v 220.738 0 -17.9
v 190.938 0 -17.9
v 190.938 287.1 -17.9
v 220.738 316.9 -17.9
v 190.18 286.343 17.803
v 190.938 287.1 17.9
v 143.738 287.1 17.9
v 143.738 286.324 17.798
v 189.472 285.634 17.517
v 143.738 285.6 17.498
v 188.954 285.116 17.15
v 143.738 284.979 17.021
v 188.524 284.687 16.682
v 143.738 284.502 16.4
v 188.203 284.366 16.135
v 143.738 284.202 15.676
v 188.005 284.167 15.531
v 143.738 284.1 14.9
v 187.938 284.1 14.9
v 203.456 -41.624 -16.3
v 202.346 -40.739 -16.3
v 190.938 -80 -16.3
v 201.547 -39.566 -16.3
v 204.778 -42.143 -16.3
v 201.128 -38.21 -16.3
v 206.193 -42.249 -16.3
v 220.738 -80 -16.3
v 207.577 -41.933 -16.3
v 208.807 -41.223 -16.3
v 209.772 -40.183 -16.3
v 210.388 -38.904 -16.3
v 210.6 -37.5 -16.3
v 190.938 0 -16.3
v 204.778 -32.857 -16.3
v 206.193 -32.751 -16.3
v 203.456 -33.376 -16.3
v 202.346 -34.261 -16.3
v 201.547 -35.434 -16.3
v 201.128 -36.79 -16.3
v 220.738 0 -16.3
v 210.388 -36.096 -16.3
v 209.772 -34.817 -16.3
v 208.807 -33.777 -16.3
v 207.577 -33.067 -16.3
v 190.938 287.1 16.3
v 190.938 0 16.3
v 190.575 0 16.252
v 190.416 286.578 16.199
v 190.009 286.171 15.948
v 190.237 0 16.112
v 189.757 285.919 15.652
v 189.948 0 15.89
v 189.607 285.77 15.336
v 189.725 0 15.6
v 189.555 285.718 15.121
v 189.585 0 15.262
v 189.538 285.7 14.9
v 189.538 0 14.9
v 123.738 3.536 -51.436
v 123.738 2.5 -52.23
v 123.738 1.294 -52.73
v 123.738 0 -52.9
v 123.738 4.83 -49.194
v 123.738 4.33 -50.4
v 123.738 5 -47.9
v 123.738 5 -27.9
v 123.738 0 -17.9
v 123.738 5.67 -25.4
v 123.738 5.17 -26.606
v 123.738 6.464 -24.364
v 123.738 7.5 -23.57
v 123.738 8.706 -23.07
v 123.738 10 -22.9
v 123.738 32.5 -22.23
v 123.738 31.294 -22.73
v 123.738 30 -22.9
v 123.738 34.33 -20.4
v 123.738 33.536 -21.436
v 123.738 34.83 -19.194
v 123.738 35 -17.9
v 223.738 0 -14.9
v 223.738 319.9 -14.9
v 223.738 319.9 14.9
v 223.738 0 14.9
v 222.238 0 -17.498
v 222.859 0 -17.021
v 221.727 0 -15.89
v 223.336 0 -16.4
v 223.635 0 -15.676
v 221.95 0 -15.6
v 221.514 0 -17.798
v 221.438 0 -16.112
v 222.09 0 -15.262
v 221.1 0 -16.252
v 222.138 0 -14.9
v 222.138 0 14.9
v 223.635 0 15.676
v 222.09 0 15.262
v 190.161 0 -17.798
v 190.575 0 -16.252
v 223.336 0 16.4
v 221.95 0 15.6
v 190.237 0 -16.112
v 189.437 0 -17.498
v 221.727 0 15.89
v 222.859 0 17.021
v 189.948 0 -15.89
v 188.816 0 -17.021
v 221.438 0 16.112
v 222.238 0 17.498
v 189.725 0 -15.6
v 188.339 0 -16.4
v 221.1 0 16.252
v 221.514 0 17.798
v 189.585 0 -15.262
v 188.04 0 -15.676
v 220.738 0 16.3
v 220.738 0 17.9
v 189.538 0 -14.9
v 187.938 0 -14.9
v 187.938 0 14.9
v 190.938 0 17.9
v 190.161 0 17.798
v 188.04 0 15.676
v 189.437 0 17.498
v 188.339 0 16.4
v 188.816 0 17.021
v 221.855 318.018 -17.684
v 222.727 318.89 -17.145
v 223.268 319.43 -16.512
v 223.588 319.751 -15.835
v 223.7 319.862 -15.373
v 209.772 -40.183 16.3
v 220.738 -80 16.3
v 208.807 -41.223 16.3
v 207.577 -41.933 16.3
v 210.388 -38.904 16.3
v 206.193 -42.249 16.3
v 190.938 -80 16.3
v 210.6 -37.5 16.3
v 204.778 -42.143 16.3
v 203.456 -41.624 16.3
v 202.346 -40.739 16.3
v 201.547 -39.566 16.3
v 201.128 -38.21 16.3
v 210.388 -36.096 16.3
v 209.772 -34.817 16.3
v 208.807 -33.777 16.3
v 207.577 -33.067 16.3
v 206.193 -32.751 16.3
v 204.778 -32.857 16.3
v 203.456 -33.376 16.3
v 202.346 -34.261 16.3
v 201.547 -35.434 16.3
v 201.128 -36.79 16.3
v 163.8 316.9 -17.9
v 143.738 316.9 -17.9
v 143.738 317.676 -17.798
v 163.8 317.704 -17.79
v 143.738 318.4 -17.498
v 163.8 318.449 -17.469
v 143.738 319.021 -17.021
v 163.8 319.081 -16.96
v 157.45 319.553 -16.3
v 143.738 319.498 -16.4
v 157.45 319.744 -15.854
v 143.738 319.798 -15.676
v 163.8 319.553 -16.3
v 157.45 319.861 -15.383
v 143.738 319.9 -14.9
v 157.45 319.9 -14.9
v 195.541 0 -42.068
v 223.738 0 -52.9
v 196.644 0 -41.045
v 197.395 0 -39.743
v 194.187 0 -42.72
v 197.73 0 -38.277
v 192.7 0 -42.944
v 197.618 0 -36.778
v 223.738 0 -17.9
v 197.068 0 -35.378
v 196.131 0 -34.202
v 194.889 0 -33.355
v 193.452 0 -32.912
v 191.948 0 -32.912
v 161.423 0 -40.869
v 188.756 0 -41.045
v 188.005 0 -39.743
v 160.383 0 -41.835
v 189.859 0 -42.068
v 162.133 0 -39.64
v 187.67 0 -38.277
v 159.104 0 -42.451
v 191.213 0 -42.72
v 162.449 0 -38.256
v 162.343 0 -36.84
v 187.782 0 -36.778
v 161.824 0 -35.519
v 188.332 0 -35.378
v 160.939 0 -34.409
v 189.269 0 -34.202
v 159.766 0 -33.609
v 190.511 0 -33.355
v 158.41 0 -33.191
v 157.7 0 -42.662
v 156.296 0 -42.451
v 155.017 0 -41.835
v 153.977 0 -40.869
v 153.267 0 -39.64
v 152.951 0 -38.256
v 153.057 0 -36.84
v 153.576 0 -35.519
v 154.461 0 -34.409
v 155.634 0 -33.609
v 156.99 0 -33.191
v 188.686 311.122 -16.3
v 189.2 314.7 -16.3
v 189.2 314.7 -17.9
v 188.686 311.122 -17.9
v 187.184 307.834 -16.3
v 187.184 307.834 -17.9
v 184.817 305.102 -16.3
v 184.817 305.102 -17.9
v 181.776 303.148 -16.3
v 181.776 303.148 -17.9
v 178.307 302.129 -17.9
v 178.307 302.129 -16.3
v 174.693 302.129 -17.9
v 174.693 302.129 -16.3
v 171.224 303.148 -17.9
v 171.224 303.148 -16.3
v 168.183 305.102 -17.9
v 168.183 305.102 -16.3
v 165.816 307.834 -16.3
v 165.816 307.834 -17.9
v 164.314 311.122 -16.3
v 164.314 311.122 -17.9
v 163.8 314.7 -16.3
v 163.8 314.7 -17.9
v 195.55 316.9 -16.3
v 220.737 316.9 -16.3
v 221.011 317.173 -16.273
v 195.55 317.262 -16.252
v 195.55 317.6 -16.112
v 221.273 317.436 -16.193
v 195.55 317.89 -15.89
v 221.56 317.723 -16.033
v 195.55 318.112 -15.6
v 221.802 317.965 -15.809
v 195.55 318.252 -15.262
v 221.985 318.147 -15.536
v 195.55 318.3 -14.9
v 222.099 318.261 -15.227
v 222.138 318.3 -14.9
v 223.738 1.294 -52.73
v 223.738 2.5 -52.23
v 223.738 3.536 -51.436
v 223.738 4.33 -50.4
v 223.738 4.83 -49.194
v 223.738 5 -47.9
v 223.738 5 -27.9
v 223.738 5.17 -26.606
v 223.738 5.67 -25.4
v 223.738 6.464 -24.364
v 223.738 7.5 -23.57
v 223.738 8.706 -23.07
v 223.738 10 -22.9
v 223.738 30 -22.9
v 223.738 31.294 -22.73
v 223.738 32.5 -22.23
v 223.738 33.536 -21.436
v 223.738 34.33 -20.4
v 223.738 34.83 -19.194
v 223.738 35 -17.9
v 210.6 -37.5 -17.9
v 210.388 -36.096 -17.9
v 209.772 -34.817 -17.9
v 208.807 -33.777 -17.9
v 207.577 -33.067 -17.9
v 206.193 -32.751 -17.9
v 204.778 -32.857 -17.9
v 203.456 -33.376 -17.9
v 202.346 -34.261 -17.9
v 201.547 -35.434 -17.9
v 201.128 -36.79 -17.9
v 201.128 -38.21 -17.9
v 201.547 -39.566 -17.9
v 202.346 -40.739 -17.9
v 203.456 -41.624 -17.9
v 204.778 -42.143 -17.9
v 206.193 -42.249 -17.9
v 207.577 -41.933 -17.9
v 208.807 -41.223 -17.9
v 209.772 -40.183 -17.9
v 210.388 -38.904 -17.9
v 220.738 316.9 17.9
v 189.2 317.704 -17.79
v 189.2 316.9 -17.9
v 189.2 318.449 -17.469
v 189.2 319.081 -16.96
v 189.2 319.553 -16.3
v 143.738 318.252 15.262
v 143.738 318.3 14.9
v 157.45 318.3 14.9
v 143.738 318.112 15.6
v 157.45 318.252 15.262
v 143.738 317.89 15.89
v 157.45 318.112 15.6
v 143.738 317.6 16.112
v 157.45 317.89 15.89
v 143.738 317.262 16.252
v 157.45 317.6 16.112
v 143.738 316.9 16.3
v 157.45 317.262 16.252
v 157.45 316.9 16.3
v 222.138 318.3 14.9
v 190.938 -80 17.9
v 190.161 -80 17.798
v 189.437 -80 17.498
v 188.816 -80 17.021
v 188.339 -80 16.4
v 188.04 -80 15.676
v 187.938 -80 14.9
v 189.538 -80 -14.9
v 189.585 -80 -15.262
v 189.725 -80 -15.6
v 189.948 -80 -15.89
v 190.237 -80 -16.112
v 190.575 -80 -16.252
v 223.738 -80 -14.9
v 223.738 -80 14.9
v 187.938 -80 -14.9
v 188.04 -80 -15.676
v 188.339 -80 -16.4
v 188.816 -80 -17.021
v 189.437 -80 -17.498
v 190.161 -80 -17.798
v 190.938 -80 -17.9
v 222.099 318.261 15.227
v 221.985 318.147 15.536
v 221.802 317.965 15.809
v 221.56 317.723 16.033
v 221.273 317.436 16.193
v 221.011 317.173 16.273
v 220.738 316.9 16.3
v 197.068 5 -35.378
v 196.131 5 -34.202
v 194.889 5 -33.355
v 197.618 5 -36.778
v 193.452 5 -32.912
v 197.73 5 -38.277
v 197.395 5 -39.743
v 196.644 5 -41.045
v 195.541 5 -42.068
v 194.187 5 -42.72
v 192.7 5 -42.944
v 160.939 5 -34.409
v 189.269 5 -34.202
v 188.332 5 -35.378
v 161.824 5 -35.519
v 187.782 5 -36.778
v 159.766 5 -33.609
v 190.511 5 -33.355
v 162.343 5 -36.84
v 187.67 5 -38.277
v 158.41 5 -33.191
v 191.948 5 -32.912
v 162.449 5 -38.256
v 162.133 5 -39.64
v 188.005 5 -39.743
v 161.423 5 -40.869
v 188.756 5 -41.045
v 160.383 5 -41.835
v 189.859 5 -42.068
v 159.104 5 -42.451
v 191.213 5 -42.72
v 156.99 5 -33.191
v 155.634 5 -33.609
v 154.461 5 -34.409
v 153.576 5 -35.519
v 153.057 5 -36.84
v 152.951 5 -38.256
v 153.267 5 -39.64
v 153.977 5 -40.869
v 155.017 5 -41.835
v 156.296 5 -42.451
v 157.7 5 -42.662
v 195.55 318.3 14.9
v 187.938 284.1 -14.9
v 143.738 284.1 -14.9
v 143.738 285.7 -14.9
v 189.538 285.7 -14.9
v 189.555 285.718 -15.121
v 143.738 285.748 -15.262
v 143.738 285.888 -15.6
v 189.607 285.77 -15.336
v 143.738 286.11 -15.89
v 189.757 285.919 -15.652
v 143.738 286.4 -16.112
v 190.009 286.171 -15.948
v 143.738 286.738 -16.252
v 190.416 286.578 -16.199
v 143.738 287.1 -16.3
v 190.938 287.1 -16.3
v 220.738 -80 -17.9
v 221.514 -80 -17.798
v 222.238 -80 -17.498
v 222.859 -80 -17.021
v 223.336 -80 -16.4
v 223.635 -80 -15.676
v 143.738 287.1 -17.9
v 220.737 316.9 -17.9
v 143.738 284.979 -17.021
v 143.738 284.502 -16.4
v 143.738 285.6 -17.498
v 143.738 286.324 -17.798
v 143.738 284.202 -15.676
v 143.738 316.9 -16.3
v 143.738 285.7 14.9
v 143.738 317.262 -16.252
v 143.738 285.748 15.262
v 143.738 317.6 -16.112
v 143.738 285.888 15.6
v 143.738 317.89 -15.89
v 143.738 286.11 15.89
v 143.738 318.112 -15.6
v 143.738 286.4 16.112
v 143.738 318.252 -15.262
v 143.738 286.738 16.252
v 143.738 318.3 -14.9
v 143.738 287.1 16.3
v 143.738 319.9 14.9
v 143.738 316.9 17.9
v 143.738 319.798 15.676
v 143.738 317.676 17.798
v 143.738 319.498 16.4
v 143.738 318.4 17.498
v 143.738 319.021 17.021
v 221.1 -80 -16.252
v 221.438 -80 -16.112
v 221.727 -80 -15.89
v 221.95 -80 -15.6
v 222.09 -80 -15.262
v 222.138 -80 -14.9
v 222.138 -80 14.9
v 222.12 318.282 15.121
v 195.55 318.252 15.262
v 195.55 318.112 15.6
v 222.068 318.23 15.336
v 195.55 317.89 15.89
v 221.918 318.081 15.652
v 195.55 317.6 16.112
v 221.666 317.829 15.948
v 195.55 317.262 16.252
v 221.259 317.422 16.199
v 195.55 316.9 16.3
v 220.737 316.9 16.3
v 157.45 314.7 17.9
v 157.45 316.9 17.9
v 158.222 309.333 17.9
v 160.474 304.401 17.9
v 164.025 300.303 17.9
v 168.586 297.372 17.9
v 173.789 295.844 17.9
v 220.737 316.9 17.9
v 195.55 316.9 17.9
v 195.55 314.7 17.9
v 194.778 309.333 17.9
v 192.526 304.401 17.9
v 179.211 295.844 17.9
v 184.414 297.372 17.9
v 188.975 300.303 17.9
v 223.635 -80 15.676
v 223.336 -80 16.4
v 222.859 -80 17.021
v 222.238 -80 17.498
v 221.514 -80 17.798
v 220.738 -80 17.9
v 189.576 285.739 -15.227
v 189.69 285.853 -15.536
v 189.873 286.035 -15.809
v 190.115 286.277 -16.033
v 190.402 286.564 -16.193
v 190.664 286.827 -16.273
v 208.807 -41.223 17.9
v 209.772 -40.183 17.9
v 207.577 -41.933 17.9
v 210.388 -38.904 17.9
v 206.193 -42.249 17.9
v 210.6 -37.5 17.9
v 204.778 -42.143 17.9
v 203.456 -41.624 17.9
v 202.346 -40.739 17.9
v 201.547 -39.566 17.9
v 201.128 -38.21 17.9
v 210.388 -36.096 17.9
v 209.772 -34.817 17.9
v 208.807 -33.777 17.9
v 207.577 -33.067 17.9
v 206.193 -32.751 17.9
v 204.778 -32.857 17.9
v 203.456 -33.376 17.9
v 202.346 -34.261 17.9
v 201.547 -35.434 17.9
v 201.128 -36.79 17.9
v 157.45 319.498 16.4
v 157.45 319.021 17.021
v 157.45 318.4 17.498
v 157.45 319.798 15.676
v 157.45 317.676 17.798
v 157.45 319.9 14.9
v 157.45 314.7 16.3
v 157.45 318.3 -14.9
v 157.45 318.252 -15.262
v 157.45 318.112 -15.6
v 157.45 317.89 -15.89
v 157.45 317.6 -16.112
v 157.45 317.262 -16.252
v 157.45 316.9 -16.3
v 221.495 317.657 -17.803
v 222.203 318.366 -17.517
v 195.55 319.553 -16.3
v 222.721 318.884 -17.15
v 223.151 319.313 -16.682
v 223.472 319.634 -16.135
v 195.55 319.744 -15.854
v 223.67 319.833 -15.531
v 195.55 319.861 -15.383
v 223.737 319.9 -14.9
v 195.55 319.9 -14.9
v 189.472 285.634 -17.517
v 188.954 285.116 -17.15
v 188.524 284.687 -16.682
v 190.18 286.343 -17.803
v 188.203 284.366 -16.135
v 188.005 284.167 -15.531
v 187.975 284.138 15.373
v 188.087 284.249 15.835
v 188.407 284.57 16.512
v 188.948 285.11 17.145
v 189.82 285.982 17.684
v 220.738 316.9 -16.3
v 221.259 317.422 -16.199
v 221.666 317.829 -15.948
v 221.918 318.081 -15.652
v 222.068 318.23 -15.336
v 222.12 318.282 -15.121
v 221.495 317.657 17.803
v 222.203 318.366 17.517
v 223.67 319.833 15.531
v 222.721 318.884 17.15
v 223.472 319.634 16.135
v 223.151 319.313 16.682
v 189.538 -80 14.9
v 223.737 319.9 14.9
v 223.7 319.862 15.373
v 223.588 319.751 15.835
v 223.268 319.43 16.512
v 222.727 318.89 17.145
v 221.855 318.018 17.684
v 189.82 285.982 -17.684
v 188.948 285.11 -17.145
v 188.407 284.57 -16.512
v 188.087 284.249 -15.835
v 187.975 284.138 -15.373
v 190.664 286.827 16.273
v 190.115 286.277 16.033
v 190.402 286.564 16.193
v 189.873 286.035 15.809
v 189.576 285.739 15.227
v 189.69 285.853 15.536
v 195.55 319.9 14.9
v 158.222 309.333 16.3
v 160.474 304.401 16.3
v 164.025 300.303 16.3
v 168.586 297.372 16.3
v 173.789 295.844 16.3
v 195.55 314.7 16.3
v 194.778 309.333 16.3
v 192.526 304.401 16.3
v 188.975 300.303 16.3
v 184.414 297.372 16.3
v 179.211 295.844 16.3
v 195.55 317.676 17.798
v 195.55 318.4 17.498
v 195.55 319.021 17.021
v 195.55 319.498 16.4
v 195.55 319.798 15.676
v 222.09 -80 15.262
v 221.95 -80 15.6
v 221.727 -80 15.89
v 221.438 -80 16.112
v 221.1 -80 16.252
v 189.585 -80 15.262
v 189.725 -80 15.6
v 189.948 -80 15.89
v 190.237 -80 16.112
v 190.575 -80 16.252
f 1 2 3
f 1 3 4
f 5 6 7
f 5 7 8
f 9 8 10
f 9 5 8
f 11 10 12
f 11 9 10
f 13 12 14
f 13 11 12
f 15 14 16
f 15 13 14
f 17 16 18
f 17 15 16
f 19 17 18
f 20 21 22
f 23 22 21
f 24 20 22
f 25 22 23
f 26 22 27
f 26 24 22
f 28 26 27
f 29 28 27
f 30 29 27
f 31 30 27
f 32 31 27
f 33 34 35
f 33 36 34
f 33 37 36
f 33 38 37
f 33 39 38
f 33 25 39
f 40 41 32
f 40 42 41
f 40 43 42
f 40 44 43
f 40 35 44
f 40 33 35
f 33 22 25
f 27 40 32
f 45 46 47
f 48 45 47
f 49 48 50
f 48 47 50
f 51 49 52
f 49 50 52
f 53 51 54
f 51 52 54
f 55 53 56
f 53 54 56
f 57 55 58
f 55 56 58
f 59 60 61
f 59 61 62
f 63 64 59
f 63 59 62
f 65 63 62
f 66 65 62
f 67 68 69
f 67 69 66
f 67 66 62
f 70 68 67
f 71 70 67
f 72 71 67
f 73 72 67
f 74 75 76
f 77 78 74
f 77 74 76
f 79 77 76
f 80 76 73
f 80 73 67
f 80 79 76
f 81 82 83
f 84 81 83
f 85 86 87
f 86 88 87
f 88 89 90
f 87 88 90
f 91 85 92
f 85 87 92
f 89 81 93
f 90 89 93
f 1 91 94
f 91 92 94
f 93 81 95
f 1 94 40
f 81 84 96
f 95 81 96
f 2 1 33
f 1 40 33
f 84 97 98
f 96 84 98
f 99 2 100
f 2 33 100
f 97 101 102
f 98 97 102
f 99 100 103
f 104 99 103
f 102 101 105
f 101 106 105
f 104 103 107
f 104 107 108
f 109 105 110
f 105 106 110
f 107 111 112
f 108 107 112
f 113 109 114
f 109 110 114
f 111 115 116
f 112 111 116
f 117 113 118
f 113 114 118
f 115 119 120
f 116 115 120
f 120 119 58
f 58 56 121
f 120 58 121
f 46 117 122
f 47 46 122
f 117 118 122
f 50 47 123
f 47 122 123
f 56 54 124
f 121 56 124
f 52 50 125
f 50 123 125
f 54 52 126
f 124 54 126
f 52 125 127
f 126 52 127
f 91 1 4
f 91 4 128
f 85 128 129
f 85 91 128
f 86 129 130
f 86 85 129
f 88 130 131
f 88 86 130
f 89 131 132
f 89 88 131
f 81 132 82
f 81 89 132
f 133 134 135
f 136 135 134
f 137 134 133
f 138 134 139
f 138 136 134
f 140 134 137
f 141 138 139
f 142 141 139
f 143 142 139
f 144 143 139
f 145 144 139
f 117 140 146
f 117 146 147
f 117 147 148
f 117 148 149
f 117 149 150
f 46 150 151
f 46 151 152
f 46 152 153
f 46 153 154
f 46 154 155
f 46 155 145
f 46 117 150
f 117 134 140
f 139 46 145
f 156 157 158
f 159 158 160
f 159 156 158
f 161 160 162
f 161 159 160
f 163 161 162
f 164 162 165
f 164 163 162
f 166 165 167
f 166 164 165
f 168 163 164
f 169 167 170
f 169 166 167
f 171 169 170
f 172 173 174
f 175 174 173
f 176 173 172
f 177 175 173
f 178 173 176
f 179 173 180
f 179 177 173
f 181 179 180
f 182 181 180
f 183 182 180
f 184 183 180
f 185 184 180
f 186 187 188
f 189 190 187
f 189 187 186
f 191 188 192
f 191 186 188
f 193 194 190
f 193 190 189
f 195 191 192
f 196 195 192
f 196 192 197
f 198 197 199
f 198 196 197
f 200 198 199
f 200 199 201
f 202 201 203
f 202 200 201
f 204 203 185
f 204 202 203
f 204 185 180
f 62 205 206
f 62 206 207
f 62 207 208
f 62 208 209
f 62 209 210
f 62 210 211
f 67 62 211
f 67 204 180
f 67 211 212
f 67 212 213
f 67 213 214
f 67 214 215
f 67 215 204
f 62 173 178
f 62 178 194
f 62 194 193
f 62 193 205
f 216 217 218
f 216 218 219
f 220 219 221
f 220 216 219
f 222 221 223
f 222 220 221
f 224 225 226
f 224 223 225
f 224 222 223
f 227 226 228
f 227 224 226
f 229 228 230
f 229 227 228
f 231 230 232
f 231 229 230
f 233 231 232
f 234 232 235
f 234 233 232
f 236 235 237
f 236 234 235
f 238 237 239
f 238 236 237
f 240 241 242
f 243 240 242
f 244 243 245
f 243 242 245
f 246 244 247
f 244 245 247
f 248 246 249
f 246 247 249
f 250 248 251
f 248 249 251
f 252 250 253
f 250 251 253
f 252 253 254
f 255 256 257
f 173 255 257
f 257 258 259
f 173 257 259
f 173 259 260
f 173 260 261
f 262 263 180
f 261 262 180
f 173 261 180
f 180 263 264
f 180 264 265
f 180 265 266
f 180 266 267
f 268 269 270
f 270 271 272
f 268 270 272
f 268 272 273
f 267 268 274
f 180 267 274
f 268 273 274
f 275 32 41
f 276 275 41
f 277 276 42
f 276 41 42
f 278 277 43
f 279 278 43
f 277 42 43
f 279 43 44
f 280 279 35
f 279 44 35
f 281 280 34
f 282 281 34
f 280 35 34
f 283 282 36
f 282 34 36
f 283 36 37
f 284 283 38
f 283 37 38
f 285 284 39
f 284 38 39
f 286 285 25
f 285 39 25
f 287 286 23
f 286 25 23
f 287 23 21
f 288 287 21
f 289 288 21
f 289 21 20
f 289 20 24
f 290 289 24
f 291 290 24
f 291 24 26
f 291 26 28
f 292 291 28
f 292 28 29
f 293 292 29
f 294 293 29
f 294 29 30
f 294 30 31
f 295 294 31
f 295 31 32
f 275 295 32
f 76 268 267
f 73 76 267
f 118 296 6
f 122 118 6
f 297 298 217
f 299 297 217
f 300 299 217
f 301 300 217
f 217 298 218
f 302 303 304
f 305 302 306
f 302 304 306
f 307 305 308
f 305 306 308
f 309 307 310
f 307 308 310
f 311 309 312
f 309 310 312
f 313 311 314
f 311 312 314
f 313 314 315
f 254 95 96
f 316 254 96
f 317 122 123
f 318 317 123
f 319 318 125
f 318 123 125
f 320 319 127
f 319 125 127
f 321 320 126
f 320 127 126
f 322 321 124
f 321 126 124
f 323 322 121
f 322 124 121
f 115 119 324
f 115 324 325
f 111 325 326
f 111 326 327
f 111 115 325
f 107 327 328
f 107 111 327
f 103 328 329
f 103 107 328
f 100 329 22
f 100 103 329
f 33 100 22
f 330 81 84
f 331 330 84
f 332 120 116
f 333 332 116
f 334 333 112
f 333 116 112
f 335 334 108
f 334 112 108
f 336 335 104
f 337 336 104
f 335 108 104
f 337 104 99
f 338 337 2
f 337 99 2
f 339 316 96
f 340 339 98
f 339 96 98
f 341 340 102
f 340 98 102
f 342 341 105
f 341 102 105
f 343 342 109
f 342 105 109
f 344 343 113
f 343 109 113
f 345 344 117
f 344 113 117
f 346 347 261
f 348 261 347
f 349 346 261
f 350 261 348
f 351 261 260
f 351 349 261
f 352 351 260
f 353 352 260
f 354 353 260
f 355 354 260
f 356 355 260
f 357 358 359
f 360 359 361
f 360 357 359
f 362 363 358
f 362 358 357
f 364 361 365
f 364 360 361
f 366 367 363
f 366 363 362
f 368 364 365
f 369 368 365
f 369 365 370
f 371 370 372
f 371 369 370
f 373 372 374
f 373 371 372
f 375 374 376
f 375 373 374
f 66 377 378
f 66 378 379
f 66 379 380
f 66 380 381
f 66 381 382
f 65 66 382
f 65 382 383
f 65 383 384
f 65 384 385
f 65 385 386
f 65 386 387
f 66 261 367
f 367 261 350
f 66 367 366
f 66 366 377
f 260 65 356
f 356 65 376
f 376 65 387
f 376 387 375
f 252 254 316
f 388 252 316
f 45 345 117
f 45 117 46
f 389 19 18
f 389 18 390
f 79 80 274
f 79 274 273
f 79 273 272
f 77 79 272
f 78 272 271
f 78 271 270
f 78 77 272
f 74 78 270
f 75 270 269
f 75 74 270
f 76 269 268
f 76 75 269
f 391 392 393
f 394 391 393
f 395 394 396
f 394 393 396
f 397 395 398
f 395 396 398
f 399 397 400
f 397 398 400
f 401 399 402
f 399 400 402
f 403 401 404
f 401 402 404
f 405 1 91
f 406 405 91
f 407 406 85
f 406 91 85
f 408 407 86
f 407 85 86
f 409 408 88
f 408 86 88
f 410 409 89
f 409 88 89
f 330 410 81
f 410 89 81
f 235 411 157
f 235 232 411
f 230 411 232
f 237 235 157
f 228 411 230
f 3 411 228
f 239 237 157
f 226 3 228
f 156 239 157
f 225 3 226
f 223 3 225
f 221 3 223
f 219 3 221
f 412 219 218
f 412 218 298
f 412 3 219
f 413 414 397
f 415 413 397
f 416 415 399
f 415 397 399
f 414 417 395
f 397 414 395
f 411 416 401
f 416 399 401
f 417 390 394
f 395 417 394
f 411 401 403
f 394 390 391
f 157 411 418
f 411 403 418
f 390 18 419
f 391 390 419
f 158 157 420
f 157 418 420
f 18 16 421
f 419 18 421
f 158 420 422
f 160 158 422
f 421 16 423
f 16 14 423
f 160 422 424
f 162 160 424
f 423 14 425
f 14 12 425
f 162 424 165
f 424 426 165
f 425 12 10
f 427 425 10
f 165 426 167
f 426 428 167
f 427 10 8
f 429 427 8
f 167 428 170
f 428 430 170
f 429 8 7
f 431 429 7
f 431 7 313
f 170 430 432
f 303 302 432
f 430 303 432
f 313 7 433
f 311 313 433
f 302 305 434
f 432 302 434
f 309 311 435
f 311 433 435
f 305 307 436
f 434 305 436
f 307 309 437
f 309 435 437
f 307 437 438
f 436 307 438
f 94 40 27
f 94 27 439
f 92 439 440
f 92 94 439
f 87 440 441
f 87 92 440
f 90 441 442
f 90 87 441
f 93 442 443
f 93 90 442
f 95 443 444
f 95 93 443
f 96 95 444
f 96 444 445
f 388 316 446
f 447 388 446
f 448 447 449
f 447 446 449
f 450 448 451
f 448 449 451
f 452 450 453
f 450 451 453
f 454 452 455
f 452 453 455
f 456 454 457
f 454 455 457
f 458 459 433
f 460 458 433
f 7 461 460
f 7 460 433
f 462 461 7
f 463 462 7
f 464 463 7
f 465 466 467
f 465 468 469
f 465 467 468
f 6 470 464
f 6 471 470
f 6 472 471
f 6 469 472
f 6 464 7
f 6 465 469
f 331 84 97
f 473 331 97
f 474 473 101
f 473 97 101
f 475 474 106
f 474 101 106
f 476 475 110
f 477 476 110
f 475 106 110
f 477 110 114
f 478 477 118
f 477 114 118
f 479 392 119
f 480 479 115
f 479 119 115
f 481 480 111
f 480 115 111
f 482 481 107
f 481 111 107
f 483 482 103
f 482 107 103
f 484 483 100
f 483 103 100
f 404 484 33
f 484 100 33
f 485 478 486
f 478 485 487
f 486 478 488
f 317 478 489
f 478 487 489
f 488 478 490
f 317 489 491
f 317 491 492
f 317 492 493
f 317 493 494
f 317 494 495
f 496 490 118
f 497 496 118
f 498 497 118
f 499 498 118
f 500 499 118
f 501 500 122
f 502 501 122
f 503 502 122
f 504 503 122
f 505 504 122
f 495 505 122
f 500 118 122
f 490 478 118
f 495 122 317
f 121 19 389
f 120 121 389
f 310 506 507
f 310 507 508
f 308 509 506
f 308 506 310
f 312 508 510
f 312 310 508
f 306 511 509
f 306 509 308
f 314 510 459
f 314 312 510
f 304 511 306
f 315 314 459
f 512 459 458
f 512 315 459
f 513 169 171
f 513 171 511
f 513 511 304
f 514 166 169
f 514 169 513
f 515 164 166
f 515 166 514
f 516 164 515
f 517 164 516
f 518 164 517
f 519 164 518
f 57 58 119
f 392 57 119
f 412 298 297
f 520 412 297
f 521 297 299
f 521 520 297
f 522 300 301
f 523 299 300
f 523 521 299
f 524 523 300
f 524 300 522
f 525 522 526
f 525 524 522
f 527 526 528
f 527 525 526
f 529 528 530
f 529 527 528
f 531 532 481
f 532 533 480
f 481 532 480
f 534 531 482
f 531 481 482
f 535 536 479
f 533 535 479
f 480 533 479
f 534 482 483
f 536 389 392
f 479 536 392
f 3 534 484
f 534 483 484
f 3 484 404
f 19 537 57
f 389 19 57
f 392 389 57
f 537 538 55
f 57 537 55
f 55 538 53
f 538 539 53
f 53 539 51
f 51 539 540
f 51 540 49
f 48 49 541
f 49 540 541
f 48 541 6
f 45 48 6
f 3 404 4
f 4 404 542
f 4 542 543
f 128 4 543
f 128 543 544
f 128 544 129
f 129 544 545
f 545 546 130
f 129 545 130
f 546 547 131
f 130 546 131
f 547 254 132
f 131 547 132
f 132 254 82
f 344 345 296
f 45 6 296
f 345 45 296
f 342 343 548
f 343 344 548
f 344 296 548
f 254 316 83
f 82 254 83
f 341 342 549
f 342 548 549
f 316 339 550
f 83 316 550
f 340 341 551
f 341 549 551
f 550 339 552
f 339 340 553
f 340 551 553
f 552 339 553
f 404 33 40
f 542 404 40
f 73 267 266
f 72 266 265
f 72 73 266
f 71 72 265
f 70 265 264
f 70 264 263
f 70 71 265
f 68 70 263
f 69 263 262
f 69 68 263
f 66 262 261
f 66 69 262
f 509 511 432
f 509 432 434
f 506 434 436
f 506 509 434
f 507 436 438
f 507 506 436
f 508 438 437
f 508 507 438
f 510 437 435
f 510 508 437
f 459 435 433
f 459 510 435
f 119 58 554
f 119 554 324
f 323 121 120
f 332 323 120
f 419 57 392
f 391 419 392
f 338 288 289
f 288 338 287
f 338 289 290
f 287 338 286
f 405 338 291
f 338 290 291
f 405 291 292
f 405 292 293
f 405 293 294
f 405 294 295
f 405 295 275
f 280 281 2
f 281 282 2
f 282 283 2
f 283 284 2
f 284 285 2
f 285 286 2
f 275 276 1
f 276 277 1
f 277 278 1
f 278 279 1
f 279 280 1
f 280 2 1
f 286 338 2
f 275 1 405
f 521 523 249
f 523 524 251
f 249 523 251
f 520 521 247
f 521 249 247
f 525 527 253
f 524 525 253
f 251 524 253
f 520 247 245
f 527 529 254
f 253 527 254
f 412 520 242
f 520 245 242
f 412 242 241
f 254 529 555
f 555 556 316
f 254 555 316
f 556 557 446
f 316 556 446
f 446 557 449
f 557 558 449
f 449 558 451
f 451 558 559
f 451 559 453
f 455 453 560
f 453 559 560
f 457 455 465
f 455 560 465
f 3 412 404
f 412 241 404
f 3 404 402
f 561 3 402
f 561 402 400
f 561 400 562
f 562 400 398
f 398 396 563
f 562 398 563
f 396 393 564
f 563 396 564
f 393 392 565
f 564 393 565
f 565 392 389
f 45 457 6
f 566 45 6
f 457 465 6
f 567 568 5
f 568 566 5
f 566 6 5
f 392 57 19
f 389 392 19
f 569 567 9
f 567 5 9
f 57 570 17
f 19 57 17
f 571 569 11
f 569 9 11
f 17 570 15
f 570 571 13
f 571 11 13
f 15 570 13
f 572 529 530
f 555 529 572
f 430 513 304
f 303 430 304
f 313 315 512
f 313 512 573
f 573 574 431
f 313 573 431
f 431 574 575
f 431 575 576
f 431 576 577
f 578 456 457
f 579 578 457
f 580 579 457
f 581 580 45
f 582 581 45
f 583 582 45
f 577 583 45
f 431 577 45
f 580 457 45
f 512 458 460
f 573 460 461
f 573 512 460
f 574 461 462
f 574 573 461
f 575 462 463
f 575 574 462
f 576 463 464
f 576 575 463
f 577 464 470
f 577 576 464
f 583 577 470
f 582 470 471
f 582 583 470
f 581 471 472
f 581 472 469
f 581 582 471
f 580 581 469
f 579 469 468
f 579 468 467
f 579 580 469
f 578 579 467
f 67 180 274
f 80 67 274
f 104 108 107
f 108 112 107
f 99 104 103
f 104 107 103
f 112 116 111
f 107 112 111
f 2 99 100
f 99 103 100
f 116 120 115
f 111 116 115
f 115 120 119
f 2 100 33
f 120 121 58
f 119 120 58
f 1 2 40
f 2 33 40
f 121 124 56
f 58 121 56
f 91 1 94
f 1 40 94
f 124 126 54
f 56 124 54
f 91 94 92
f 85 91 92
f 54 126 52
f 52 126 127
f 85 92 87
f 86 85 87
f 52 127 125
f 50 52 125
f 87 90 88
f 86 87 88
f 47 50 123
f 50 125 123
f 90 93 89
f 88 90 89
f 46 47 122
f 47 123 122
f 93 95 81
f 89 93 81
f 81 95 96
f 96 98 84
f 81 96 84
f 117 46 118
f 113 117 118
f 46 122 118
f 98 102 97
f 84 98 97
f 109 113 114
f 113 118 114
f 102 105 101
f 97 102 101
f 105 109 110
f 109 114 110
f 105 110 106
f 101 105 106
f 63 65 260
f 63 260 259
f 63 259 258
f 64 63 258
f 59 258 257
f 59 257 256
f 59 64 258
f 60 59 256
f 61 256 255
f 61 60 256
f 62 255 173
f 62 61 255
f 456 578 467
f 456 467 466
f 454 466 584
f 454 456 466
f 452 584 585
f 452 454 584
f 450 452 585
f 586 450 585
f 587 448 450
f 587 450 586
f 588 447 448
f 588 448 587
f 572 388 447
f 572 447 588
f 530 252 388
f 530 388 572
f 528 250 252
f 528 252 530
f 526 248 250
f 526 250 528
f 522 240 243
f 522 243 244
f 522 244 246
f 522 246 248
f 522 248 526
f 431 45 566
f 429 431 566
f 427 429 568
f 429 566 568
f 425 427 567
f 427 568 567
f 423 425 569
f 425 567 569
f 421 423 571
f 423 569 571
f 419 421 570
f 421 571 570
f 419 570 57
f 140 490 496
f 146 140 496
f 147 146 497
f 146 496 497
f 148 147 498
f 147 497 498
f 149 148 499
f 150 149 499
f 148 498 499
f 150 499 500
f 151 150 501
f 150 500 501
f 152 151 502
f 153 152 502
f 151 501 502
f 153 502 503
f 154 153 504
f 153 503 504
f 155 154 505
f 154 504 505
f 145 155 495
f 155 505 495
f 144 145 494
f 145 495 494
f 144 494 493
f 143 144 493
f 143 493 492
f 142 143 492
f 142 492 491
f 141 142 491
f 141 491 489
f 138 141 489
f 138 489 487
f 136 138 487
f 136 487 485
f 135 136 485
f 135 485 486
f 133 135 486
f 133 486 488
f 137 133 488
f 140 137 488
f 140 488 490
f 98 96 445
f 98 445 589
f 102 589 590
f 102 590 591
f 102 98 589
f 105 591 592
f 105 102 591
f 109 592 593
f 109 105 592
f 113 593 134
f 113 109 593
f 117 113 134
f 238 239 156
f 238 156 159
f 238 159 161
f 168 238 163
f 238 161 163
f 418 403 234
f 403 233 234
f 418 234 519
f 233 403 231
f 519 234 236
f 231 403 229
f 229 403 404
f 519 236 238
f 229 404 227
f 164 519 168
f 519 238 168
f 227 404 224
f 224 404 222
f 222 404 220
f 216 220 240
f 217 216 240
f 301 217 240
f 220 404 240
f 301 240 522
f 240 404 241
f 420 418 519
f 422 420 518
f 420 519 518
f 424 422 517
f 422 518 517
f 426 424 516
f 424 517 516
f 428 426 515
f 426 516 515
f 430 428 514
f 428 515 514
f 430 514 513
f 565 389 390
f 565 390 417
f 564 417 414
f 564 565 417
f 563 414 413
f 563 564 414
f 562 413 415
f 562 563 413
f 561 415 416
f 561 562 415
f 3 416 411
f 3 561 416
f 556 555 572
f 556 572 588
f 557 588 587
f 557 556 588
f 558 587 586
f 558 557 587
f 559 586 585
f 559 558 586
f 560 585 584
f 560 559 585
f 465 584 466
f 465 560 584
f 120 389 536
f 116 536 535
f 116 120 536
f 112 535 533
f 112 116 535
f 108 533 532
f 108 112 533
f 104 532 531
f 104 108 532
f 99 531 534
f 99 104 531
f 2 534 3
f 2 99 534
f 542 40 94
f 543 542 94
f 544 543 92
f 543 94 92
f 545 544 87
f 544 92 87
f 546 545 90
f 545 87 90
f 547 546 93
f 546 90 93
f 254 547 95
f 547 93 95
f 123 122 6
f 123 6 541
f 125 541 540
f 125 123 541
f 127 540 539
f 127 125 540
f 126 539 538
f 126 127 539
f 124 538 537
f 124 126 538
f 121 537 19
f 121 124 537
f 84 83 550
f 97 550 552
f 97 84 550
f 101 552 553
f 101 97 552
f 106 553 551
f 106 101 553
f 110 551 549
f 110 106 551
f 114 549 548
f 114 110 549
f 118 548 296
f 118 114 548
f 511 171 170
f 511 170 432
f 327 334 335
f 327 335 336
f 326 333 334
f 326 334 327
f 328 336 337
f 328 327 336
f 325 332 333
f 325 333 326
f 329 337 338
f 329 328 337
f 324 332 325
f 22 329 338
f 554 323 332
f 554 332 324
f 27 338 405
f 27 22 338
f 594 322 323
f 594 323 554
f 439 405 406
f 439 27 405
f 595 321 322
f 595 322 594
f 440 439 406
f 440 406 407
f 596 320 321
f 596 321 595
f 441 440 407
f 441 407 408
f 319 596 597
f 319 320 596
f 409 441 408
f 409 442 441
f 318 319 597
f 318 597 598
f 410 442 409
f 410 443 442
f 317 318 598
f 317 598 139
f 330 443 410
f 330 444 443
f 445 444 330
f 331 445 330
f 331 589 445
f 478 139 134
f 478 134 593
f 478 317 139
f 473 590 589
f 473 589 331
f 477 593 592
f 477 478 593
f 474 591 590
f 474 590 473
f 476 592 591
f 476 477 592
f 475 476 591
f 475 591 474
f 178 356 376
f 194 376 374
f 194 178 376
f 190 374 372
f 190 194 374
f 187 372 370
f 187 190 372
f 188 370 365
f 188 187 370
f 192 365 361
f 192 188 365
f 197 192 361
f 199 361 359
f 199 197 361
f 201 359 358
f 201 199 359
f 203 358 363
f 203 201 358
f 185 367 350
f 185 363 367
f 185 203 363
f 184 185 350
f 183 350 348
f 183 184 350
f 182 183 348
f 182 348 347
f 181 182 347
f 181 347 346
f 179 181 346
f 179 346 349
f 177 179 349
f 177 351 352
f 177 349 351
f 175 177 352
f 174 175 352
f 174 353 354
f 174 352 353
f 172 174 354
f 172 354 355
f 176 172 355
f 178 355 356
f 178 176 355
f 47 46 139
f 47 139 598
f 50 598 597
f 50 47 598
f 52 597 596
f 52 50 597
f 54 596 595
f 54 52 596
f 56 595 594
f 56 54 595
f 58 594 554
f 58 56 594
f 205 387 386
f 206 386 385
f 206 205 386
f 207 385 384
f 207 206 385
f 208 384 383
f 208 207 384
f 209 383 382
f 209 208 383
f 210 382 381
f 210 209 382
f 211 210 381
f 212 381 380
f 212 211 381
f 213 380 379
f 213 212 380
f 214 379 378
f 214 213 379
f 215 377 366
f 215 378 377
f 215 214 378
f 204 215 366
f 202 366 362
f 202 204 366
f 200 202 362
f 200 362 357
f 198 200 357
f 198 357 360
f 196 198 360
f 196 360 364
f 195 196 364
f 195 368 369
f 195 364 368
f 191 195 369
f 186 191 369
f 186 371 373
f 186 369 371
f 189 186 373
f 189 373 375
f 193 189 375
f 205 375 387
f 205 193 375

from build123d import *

# Parameters (mm, degrees)
STRUCTURAL_MEMBERMAIN_DEPTH        = 1
STRUCTURAL_MEMBERMAIN_DEPTH_BACK   = 80
STRUCTURAL_MEMBERMAIN_2_DEPTH      = 329.314422766
STRUCTURAL_MEMBERMAIN_3_DEPTH      = 88.414422766
CUT_EXTRUDETOPRAILGUIDE_DEPTH      = 391.78752399
CUT_EXTRUDETOPRAILGUIDE_DEPTH_BACK = 391.78752399
STRUCTURAL_MEMBERANGLE_DEPTH       = 100
SKETCH15_R                         = 4.7625
SKETCH15_R_2                       = 5.044092484
CUT_EXTRUDEMOUNTINGHOLES_DEPTH     = 394.945286691
CUT_EXTRUDEENLARGERAILGUIDE_START  = -16.3
CUT_EXTRUDEENLARGERAILGUIDE_DEPTH  = 34.2
SKETCH17_R                         = 4.7625
CUT_EXTRUDE1_DEPTH                 = 397.745660224


with BuildPart() as part:
    # Sketch11 → Structural MemberMain (new, two sides)
    with BuildSketch(Plane(origin=(205.8375, 0, 0), x_dir=(-1, 0, 0), z_dir=(0, 1, 0))) as structural_membermain_sk:
        with BuildLine():
            Line((-14.9, 17.9), (14.9, 17.9))
            ThreePointArc((14.9, 17.9), (17.021320344, 17.021320344), (17.9, 14.9))
            Line((17.9, 14.9), (17.9, -14.9))
            ThreePointArc((17.9, -14.9), (17.021320344, -17.021320344), (14.9, -17.9))
            Line((14.9, -17.9), (-14.9, -17.9))
            ThreePointArc((-14.9, -17.9), (-17.021320344, -17.021320344), (-17.9, -14.9))
            Line((-17.9, -14.9), (-17.9, 14.9))
            ThreePointArc((-17.9, 14.9), (-17.021320344, 17.021320344), (-14.9, 17.9))
        make_face()
        with BuildLine():
            Line((-14.9, 16.3), (14.9, 16.3))
            ThreePointArc((14.9, 16.3), (15.889949494, 15.889949494), (16.3, 14.9))
            Line((16.3, 14.9), (16.3, -14.9))
            ThreePointArc((16.3, -14.9), (15.889949494, -15.889949494), (14.9, -16.3))
            Line((14.9, -16.3), (-14.9, -16.3))
            ThreePointArc((-14.9, -16.3), (-15.889949494, -15.889949494), (-16.3, -14.9))
            Line((-16.3, -14.9), (-16.3, 14.9))
            ThreePointArc((-16.3, 14.9), (-15.889949494, 15.889949494), (-14.9, 16.3))
        make_face(mode=Mode.SUBTRACT)
    extrude(amount=STRUCTURAL_MEMBERMAIN_DEPTH)
    extrude(structural_membermain_sk.sketch, amount=-STRUCTURAL_MEMBERMAIN_DEPTH_BACK)

    # Structural MemberMain mitre 1
    split(bisect_by=Plane(origin=(205.8375, 0, 0), x_dir=(1, 0, 0), z_dir=(0, -1, 0)), keep=Keep.TOP)

    # Sketch17 → Cut-Extrude1 (cut, through all)
    with BuildSketch(Plane.XY.offset(17.9)):
        with Locations((205.8375, -37.5)):
            Circle(SKETCH17_R)
    extrude(amount=-CUT_EXTRUDE1_DEPTH, mode=Mode.SUBTRACT)


with BuildPart() as body_2:
    # Sketch11 on segment 2 (carried to segment 2) → Structural MemberMain 2 (new body)
    with BuildSketch(Plane(origin=(205.8375, -1, 0), x_dir=(-1, 0, 0), z_dir=(0, 1, 0))):
        with BuildLine():
            Line((-14.9, 17.9), (14.9, 17.9))
            ThreePointArc((14.9, 17.9), (17.021320344, 17.021320344), (17.9, 14.9))
            Line((17.9, 14.9), (17.9, -14.9))
            ThreePointArc((17.9, -14.9), (17.021320344, -17.021320344), (14.9, -17.9))
            Line((14.9, -17.9), (-14.9, -17.9))
            ThreePointArc((-14.9, -17.9), (-17.021320344, -17.021320344), (-17.9, -14.9))
            Line((-17.9, -14.9), (-17.9, 14.9))
            ThreePointArc((-17.9, 14.9), (-17.021320344, 17.021320344), (-14.9, 17.9))
        make_face()
        with BuildLine():
            Line((-14.9, 16.3), (14.9, 16.3))
            ThreePointArc((14.9, 16.3), (15.889949494, 15.889949494), (16.3, 14.9))
            Line((16.3, 14.9), (16.3, -14.9))
            ThreePointArc((16.3, -14.9), (15.889949494, -15.889949494), (14.9, -16.3))
            Line((14.9, -16.3), (-14.9, -16.3))
            ThreePointArc((-14.9, -16.3), (-15.889949494, -15.889949494), (-16.3, -14.9))
            Line((-16.3, -14.9), (-16.3, 14.9))
            ThreePointArc((-16.3, 14.9), (-15.889949494, 15.889949494), (-14.9, 16.3))
        make_face(mode=Mode.SUBTRACT)
    extrude(amount=STRUCTURAL_MEMBERMAIN_2_DEPTH)

    # Structural MemberMain 2 mitre 1
    split(bisect_by=Plane(origin=(205.8375, 0, 0), x_dir=(-1, 0, 0), z_dir=(0, 1, 0)), keep=Keep.TOP)

    # Structural MemberMain 2 mitre 2
    split(bisect_by=Plane(origin=(205.8375, 302, 0), x_dir=(0.707106781, 0.707106781, 0), z_dir=(0.707106781, -0.707106781, 0)), keep=Keep.TOP)


with BuildPart() as body_3:
    # Sketch11 on segment 3 (carried to segment 3) → Structural MemberMain 3 (new body)
    with BuildSketch(Plane(origin=(232.151922766, 302, 0), x_dir=(0, -1, 0), z_dir=(-1, 0, 0))):
        with BuildLine():
            Line((-14.9, 17.9), (14.9, 17.9))
            ThreePointArc((14.9, 17.9), (17.021320344, 17.021320344), (17.9, 14.9))
            Line((17.9, 14.9), (17.9, -14.9))
            ThreePointArc((17.9, -14.9), (17.021320344, -17.021320344), (14.9, -17.9))
            Line((14.9, -17.9), (-14.9, -17.9))
            ThreePointArc((-14.9, -17.9), (-17.021320344, -17.021320344), (-17.9, -14.9))
            Line((-17.9, -14.9), (-17.9, 14.9))
            ThreePointArc((-17.9, 14.9), (-17.021320344, 17.021320344), (-14.9, 17.9))
        make_face()
        with BuildLine():
            Line((-14.9, 16.3), (14.9, 16.3))
            ThreePointArc((14.9, 16.3), (15.889949494, 15.889949494), (16.3, 14.9))
            Line((16.3, 14.9), (16.3, -14.9))
            ThreePointArc((16.3, -14.9), (15.889949494, -15.889949494), (14.9, -16.3))
            Line((14.9, -16.3), (-14.9, -16.3))
            ThreePointArc((-14.9, -16.3), (-15.889949494, -15.889949494), (-16.3, -14.9))
            Line((-16.3, -14.9), (-16.3, 14.9))
            ThreePointArc((-16.3, 14.9), (-15.889949494, 15.889949494), (-14.9, 16.3))
        make_face(mode=Mode.SUBTRACT)
    extrude(amount=STRUCTURAL_MEMBERMAIN_3_DEPTH)

    # Structural MemberMain 3 mitre 1
    split(bisect_by=Plane(origin=(205.8375, 302, 0), x_dir=(-0.707106781, -0.707106781, 0), z_dir=(-0.707106781, 0.707106781, 0)), keep=Keep.TOP)

    # Sketch12 → Cut-ExtrudeTopRailGuide (cut, two sides)
    with BuildSketch(Plane.XY) as cut_extrudetoprailguide_sk:
        with BuildLine():
            Line((163.8, 314.7), (163.8, 325.1))
            ThreePointArc((163.8, 325.1), (176.5, 337.8), (189.2, 325.1))
            Line((189.2, 325.1), (189.2, 314.7))
            ThreePointArc((189.2, 314.7), (176.5, 302), (163.8, 314.7))
        make_face()
    extrude(amount=CUT_EXTRUDETOPRAILGUIDE_DEPTH, mode=Mode.SUBTRACT)
    extrude(cut_extrudetoprailguide_sk.sketch, amount=-CUT_EXTRUDETOPRAILGUIDE_DEPTH_BACK, mode=Mode.SUBTRACT)

    # Sketch16 → Cut-ExtrudeEnlargeRailGuide (cut)
    with BuildSketch(Plane.XY.offset(CUT_EXTRUDEENLARGERAILGUIDE_START)):
        with BuildLine():
            Line((195.55, 314.7), (195.55, 325.1))
            ThreePointArc((195.55, 325.1), (176.5, 344.15), (157.45, 325.1))
            Line((157.45, 325.1), (157.45, 314.7))
            ThreePointArc((157.45, 314.7), (176.5, 295.65), (195.55, 314.7))
        make_face()
    extrude(amount=CUT_EXTRUDEENLARGERAILGUIDE_DEPTH, mode=Mode.SUBTRACT)


with BuildPart() as body_4:
    # Sketch14 → Structural MemberAngle (new body)
    with BuildSketch(Plane(origin=(123.7375, 0, -17.9), x_dir=(0, 0, -1), z_dir=(1, 0, 0))):
        with BuildLine():
            Line((0, 0), (0, 35))
            ThreePointArc((0, 35), (3.535533906, 33.535533906), (5, 30))
            Line((5, 30), (5, 10))
            ThreePointArc((5, 10), (6.464466094, 6.464466094), (10, 5))
            Line((10, 5), (30, 5))
            ThreePointArc((30, 5), (33.535533906, 3.535533906), (35, 0))
            Line((35, 0), (0, 0))
        make_face()
    extrude(amount=STRUCTURAL_MEMBERANGLE_DEPTH)

    # Sketch15 → Cut-ExtrudeMountingHoles (cut, through all)
    with BuildSketch(Plane(origin=(0, 0, 0), x_dir=(1, 0, 0), z_dir=(0, 1, 0))):
        with Locations(Location((157.7, 37.9, 0), (0, 0, 90))):
            Circle(SKETCH15_R)
        with Locations(Location((192.7, 37.9, 0), (0, 0, 90))):
            Circle(SKETCH15_R_2)
    extrude(amount=CUT_EXTRUDEMOUNTINGHOLES_DEPTH, mode=Mode.SUBTRACT)


solid = Compound([part.part, body_2.part, body_3.part, body_4.part])
